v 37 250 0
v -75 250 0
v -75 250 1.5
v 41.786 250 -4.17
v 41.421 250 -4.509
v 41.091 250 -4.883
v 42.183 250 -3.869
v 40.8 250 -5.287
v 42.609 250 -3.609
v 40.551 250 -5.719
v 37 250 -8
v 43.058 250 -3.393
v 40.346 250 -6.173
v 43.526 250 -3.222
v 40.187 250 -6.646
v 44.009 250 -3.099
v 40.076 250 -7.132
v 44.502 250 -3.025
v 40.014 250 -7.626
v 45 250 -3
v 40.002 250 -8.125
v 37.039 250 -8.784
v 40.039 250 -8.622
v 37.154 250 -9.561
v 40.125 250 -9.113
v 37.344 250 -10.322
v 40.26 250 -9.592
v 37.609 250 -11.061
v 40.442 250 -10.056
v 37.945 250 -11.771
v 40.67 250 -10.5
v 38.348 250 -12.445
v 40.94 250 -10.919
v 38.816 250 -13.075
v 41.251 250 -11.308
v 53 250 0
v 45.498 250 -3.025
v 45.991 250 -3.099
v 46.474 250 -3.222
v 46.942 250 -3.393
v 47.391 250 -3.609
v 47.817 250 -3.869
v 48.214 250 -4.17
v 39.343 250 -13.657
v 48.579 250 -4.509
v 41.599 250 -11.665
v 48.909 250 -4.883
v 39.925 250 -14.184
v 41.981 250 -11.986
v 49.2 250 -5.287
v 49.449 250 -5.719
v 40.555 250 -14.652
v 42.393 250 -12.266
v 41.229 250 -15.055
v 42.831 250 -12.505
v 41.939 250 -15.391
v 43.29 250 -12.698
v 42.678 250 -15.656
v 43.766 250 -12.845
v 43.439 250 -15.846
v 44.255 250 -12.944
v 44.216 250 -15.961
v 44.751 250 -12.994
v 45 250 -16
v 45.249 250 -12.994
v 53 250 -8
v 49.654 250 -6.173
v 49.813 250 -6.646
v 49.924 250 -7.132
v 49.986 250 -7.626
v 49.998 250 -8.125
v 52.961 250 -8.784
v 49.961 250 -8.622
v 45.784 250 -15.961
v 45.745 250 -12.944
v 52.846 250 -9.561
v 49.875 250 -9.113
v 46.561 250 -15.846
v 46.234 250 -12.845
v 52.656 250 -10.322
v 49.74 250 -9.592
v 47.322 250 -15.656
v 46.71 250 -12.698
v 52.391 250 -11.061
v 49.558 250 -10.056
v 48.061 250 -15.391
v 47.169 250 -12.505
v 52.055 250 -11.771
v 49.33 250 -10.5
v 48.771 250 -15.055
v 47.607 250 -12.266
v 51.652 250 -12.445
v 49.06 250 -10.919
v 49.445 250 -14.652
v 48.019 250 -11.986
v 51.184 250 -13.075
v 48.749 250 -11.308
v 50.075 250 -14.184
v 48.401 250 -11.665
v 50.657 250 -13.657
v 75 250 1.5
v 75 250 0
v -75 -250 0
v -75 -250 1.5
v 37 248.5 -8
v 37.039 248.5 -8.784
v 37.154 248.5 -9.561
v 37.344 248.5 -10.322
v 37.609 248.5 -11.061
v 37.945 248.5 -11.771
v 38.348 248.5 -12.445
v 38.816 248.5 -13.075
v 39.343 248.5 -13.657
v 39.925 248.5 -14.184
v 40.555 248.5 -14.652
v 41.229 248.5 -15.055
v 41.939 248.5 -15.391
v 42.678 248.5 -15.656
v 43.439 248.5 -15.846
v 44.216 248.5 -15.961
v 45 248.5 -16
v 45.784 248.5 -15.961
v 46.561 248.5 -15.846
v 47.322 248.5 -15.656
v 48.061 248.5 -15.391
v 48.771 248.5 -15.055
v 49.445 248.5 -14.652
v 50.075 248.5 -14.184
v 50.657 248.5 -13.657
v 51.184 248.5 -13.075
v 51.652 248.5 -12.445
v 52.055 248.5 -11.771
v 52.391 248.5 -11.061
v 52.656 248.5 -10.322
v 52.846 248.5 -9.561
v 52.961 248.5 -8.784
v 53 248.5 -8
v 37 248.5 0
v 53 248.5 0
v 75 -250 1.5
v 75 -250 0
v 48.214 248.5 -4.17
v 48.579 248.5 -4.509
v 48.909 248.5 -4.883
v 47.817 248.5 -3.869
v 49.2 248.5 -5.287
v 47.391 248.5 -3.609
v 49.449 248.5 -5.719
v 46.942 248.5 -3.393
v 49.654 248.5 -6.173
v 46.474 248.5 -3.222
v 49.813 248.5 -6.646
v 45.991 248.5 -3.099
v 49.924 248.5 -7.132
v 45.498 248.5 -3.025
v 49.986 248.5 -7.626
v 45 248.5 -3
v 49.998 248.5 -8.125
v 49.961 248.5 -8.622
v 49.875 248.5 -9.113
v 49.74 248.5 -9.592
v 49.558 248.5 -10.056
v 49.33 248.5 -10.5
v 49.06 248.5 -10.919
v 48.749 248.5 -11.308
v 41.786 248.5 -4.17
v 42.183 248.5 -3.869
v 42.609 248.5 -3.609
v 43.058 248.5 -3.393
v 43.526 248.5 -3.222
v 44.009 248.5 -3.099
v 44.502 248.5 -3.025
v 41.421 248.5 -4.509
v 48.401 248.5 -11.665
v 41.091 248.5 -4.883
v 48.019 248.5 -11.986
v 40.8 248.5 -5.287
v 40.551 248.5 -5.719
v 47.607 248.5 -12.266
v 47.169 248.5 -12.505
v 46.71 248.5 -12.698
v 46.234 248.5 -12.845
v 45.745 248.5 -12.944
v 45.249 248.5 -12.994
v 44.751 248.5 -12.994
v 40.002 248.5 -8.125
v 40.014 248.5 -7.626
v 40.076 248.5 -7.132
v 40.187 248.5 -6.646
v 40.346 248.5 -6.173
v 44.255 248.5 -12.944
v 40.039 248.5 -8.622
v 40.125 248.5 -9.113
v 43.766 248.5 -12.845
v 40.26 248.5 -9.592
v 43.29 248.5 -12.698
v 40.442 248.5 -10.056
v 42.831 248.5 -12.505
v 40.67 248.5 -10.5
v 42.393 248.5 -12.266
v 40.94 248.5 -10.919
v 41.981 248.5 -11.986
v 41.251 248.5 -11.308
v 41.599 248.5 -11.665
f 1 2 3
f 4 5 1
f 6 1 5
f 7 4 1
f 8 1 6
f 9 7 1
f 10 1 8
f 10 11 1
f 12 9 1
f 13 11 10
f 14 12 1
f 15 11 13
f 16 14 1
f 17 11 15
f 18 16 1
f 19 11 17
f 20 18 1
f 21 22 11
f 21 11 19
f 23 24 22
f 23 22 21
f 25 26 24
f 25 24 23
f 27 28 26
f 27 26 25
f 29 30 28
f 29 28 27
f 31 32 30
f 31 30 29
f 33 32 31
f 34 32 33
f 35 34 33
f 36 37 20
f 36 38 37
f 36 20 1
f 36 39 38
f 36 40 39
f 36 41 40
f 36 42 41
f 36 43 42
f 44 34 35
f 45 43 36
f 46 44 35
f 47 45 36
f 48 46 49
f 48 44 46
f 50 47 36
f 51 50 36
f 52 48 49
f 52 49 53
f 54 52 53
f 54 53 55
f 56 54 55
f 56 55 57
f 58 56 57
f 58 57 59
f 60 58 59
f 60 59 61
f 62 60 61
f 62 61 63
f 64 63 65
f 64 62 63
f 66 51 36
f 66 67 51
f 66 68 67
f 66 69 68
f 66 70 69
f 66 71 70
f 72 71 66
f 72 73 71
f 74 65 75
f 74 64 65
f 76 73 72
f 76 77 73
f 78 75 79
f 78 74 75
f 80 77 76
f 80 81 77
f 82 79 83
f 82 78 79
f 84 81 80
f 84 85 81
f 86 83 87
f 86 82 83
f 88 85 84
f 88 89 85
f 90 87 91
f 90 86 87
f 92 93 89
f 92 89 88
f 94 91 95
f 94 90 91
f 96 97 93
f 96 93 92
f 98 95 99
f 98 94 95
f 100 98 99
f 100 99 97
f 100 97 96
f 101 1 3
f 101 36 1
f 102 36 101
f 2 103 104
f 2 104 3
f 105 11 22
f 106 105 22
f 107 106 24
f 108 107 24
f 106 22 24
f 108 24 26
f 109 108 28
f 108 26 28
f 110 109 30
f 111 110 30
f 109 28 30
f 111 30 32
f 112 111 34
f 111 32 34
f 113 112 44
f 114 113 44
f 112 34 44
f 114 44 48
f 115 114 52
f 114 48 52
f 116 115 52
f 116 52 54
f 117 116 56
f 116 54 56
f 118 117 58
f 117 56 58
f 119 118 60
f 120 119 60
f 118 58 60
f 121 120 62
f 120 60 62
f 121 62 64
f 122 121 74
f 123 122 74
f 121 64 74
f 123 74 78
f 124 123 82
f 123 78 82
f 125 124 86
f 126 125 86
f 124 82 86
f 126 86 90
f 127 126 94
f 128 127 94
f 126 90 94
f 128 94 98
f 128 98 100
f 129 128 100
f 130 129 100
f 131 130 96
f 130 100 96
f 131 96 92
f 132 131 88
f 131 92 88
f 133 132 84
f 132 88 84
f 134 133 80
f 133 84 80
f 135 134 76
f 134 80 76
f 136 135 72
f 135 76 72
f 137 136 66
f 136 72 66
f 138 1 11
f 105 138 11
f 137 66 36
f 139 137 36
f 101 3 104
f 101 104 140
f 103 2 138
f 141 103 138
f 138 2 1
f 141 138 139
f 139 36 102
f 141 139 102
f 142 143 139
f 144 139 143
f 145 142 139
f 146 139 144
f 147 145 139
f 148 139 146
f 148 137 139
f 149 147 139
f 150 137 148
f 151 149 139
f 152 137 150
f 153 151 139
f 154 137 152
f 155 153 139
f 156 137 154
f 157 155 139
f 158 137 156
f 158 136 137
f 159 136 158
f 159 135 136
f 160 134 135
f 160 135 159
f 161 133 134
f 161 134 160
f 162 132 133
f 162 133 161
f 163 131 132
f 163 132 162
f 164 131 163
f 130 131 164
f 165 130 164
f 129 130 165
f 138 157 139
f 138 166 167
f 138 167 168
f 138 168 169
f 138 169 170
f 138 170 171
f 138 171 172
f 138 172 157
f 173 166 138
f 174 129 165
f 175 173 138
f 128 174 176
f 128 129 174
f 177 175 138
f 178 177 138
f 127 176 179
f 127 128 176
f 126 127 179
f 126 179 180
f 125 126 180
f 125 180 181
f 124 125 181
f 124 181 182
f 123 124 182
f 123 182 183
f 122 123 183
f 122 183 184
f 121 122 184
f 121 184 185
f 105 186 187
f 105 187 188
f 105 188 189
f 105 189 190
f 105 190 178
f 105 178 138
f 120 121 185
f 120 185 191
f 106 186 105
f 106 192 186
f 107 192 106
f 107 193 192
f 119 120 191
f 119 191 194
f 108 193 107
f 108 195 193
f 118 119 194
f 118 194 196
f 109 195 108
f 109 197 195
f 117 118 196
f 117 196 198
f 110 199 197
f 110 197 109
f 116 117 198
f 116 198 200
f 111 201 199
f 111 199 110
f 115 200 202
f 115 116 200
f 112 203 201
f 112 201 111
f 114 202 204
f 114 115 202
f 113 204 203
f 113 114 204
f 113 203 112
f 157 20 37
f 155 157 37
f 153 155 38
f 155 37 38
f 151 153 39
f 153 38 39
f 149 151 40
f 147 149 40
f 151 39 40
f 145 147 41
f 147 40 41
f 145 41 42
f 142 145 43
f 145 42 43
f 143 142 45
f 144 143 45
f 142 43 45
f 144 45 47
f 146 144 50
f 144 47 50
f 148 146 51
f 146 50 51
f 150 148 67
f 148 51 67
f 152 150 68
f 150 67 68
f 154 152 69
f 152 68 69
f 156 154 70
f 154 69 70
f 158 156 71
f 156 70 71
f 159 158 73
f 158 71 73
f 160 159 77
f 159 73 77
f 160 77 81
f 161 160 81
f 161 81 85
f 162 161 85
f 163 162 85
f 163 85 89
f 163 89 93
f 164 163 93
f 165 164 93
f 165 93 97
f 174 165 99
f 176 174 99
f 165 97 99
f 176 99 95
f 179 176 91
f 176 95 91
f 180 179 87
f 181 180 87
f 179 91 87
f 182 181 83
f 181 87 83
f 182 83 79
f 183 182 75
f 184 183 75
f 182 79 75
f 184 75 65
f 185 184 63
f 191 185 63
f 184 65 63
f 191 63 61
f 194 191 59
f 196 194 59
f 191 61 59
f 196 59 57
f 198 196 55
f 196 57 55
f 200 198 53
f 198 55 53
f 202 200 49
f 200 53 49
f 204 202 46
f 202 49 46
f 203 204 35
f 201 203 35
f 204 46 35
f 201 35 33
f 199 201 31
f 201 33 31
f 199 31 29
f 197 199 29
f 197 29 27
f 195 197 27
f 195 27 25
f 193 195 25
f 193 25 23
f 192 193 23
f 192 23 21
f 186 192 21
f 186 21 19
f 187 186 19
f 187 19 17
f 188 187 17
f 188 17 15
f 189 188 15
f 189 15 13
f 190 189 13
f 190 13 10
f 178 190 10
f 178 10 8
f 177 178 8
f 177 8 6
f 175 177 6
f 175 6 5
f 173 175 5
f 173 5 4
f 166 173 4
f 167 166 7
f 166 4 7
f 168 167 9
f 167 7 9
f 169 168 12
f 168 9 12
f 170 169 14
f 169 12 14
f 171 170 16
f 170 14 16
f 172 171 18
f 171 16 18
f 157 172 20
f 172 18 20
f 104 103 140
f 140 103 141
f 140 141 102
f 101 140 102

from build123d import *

# Parameters (mm, degrees)
SKETCH2_W           = 150
SKETCH2_H           = 500
BOSS_EXTRUDE1_DEPTH = 1.5
SKETCH3_R           = 5
BOSS_EXTRUDE2_DEPTH = 1.5


with BuildPart() as part:
    # Sketch2 → Boss-Extrude1 (new body)
    with BuildSketch(Plane.XY):
        Rectangle(SKETCH2_W, SKETCH2_H)
    extrude(amount=BOSS_EXTRUDE1_DEPTH)

    # Sketch3 → Boss-Extrude2 (add)
    with BuildSketch(Plane(origin=(0, 250, 0), x_dir=(1, 0, 0), z_dir=(0, 1, 0))):
        with BuildLine():
            Line((37, 0), (37, 8))
            ThreePointArc((37, 8), (45, 16), (53, 8))
            Line((53, 8), (53, 0))
            Line((53, 0), (37, 0))
        make_face()
        with Locations(Location((45, 8, 0), (0, 0, 270))):
            Circle(SKETCH3_R, mode=Mode.SUBTRACT)
    extrude(amount=-BOSS_EXTRUDE2_DEPTH)


solid = part.part
